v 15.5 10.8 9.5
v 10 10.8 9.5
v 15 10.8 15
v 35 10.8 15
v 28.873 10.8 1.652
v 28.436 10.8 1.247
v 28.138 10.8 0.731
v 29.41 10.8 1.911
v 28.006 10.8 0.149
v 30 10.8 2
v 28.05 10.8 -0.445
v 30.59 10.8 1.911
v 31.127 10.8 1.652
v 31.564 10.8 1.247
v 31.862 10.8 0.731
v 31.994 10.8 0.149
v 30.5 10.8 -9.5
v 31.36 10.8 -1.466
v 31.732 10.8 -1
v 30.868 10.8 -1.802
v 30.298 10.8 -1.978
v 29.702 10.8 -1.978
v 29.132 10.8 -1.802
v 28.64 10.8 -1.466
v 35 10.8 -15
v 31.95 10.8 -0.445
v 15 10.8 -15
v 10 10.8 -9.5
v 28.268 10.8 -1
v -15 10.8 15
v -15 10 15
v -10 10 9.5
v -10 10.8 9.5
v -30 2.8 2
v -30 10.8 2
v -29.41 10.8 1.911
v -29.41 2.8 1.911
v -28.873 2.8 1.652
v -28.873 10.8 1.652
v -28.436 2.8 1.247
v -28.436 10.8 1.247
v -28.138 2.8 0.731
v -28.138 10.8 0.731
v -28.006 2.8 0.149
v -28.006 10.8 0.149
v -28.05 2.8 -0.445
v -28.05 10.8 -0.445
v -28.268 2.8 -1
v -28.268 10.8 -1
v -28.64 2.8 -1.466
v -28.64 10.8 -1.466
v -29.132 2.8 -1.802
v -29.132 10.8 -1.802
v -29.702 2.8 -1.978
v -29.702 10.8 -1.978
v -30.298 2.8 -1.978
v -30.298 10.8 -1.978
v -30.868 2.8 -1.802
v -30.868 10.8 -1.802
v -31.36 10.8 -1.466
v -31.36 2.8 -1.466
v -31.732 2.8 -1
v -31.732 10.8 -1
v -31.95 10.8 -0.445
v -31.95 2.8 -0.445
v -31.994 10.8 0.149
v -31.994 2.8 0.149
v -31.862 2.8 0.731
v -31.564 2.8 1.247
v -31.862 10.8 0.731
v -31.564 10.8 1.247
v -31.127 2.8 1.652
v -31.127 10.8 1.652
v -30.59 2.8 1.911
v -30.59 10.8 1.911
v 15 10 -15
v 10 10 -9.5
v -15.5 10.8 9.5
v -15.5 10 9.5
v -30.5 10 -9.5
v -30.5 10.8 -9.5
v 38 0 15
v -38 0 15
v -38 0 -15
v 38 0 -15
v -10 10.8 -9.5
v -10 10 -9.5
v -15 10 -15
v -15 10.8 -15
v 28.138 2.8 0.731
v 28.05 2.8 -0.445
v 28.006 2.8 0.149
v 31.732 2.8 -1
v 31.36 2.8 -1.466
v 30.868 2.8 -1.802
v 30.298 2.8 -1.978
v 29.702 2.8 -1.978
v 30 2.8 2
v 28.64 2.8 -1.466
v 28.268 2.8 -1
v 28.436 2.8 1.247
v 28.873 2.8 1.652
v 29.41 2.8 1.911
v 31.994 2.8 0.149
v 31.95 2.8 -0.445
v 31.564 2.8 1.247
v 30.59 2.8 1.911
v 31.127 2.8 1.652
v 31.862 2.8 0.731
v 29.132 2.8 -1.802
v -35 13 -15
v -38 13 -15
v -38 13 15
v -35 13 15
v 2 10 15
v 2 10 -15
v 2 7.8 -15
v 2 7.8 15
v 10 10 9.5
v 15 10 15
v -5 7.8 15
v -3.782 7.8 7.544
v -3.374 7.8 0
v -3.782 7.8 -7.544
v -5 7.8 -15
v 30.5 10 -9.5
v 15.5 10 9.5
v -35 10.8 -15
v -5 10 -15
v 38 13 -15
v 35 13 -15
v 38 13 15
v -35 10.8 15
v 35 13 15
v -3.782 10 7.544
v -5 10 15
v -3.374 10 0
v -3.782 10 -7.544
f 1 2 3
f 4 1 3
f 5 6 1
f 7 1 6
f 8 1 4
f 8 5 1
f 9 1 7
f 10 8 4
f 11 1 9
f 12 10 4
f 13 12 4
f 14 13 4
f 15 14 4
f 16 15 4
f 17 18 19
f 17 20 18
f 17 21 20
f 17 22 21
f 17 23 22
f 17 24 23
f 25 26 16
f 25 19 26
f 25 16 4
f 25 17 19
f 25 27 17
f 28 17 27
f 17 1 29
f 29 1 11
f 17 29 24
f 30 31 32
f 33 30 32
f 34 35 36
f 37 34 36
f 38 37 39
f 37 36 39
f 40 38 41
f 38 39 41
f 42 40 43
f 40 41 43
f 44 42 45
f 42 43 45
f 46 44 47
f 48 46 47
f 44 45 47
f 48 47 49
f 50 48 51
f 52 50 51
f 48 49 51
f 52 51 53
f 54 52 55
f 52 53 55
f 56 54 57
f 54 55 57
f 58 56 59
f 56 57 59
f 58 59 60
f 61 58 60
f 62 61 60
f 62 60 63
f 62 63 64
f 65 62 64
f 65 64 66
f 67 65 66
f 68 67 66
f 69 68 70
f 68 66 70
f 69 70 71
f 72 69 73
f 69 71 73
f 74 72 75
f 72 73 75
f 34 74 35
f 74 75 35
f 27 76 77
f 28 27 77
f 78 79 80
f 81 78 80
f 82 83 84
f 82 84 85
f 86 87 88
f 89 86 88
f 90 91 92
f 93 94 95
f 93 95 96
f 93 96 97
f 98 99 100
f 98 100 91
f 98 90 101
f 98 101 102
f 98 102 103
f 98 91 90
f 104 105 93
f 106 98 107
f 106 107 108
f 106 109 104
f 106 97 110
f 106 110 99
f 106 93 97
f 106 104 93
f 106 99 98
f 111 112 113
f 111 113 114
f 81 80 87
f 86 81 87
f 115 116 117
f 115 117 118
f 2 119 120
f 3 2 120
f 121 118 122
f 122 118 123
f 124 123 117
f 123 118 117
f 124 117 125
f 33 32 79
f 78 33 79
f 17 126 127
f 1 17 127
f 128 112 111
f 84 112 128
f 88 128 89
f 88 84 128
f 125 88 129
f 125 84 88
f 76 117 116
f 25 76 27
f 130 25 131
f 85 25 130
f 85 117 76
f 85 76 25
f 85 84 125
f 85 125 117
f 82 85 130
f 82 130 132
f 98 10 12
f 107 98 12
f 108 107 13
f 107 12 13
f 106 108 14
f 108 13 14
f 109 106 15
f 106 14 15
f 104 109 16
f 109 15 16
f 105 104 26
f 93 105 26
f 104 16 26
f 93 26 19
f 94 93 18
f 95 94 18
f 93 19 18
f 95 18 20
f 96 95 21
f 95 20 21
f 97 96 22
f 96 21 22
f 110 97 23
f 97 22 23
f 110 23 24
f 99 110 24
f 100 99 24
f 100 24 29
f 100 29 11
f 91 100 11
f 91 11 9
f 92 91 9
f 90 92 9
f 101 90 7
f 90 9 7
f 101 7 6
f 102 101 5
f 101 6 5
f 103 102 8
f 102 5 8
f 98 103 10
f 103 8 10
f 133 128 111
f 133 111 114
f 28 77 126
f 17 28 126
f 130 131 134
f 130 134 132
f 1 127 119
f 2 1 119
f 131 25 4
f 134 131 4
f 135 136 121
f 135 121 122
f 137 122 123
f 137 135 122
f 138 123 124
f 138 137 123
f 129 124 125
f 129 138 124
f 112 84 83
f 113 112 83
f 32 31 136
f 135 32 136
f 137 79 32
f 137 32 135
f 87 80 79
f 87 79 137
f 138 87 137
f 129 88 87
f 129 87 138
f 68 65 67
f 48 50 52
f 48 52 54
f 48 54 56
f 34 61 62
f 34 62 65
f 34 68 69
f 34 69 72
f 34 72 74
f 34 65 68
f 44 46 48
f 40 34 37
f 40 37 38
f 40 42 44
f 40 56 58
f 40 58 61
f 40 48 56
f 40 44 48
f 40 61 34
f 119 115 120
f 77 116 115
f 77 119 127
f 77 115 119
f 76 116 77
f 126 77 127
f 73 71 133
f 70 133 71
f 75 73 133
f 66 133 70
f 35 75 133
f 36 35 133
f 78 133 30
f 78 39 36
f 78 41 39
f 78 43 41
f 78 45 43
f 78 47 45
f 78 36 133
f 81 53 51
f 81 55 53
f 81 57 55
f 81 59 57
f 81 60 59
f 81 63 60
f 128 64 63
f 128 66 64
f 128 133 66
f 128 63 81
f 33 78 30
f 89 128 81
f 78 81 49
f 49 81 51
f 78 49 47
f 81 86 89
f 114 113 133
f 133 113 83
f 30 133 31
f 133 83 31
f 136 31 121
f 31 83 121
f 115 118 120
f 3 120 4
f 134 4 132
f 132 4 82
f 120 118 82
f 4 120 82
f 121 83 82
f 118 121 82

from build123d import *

# Parameters (mm, degrees)
SKETCH1_W           = 70
SKETCH1_H           = 30
BOSS_EXTRUDE1_DEPTH = 10
BOSS_EXTRUDE2_DEPTH = 0.8
CUT_EXTRUDE1_DEPTH  = 2.2
SKETCH4_R           = 2
CUT_EXTRUDE2_DEPTH  = 8
SKETCH5_W           = 3
SKETCH5_H           = 30
BOSS_EXTRUDE3_DEPTH = 13


with BuildPart() as part:
    # Sketch1 → Boss-Extrude1 (new body)
    with BuildSketch(Plane(origin=(0, 0, 0), x_dir=(1, 0, 0), z_dir=(0, 1, 0))):
        Rectangle(SKETCH1_W, SKETCH1_H)
    extrude(amount=BOSS_EXTRUDE1_DEPTH)

    # Sketch2 → Boss-Extrude2 (add)
    with BuildSketch(Plane(origin=(0, 10, 0), x_dir=(1, 0, 0), z_dir=(0, 1, 0))):
        Polygon((-15.5, -9.5), (-30.5, 9.5), (-10, 9.5), (-15, 15), (-35, 15), (-35, -15), (-15, -15), (-10, -9.5), align=None)
        Polygon((15, 15), (10, 9.5), (30.5, 9.5), (15.5, -9.5), (10, -9.5), (15, -15), (35, -15), (35, 15), align=None)
    extrude(amount=BOSS_EXTRUDE2_DEPTH)

    # Sketch3 → Cut-Extrude1 (cut)
    with BuildSketch(Plane(origin=(0, 10, 0), x_dir=(1, 0, 0), z_dir=(0, 1, 0))):
        with BuildLine():
            Line((2, 15), (2, -15))
            Line((2, -15), (-5, -15))
            ThreePointArc((-5, -15), (-3.373971656, 0), (-5, 15))
            Line((-5, 15), (2, 15))
        make_face()
    extrude(amount=-CUT_EXTRUDE1_DEPTH, mode=Mode.SUBTRACT)

    # Sketch4 → Cut-Extrude2 (cut)
    with BuildSketch(Plane(origin=(0, 10.8, 0), x_dir=(1, 0, 0), z_dir=(0, 1, 0))):
        with Locations((-30, 0)):
            Circle(SKETCH4_R)
        with Locations((30, 0)):
            Circle(SKETCH4_R)
    extrude(amount=-CUT_EXTRUDE2_DEPTH, mode=Mode.SUBTRACT)

    # Sketch5 → Boss-Extrude3 (add)
    with BuildSketch(Plane.XZ):
        with Locations((-36.5, 0)):
            Rectangle(SKETCH5_W, SKETCH5_H)
        with Locations((36.5, 0)):
            Rectangle(SKETCH5_W, SKETCH5_H)
    extrude(amount=-BOSS_EXTRUDE3_DEPTH)


solid = part.part
